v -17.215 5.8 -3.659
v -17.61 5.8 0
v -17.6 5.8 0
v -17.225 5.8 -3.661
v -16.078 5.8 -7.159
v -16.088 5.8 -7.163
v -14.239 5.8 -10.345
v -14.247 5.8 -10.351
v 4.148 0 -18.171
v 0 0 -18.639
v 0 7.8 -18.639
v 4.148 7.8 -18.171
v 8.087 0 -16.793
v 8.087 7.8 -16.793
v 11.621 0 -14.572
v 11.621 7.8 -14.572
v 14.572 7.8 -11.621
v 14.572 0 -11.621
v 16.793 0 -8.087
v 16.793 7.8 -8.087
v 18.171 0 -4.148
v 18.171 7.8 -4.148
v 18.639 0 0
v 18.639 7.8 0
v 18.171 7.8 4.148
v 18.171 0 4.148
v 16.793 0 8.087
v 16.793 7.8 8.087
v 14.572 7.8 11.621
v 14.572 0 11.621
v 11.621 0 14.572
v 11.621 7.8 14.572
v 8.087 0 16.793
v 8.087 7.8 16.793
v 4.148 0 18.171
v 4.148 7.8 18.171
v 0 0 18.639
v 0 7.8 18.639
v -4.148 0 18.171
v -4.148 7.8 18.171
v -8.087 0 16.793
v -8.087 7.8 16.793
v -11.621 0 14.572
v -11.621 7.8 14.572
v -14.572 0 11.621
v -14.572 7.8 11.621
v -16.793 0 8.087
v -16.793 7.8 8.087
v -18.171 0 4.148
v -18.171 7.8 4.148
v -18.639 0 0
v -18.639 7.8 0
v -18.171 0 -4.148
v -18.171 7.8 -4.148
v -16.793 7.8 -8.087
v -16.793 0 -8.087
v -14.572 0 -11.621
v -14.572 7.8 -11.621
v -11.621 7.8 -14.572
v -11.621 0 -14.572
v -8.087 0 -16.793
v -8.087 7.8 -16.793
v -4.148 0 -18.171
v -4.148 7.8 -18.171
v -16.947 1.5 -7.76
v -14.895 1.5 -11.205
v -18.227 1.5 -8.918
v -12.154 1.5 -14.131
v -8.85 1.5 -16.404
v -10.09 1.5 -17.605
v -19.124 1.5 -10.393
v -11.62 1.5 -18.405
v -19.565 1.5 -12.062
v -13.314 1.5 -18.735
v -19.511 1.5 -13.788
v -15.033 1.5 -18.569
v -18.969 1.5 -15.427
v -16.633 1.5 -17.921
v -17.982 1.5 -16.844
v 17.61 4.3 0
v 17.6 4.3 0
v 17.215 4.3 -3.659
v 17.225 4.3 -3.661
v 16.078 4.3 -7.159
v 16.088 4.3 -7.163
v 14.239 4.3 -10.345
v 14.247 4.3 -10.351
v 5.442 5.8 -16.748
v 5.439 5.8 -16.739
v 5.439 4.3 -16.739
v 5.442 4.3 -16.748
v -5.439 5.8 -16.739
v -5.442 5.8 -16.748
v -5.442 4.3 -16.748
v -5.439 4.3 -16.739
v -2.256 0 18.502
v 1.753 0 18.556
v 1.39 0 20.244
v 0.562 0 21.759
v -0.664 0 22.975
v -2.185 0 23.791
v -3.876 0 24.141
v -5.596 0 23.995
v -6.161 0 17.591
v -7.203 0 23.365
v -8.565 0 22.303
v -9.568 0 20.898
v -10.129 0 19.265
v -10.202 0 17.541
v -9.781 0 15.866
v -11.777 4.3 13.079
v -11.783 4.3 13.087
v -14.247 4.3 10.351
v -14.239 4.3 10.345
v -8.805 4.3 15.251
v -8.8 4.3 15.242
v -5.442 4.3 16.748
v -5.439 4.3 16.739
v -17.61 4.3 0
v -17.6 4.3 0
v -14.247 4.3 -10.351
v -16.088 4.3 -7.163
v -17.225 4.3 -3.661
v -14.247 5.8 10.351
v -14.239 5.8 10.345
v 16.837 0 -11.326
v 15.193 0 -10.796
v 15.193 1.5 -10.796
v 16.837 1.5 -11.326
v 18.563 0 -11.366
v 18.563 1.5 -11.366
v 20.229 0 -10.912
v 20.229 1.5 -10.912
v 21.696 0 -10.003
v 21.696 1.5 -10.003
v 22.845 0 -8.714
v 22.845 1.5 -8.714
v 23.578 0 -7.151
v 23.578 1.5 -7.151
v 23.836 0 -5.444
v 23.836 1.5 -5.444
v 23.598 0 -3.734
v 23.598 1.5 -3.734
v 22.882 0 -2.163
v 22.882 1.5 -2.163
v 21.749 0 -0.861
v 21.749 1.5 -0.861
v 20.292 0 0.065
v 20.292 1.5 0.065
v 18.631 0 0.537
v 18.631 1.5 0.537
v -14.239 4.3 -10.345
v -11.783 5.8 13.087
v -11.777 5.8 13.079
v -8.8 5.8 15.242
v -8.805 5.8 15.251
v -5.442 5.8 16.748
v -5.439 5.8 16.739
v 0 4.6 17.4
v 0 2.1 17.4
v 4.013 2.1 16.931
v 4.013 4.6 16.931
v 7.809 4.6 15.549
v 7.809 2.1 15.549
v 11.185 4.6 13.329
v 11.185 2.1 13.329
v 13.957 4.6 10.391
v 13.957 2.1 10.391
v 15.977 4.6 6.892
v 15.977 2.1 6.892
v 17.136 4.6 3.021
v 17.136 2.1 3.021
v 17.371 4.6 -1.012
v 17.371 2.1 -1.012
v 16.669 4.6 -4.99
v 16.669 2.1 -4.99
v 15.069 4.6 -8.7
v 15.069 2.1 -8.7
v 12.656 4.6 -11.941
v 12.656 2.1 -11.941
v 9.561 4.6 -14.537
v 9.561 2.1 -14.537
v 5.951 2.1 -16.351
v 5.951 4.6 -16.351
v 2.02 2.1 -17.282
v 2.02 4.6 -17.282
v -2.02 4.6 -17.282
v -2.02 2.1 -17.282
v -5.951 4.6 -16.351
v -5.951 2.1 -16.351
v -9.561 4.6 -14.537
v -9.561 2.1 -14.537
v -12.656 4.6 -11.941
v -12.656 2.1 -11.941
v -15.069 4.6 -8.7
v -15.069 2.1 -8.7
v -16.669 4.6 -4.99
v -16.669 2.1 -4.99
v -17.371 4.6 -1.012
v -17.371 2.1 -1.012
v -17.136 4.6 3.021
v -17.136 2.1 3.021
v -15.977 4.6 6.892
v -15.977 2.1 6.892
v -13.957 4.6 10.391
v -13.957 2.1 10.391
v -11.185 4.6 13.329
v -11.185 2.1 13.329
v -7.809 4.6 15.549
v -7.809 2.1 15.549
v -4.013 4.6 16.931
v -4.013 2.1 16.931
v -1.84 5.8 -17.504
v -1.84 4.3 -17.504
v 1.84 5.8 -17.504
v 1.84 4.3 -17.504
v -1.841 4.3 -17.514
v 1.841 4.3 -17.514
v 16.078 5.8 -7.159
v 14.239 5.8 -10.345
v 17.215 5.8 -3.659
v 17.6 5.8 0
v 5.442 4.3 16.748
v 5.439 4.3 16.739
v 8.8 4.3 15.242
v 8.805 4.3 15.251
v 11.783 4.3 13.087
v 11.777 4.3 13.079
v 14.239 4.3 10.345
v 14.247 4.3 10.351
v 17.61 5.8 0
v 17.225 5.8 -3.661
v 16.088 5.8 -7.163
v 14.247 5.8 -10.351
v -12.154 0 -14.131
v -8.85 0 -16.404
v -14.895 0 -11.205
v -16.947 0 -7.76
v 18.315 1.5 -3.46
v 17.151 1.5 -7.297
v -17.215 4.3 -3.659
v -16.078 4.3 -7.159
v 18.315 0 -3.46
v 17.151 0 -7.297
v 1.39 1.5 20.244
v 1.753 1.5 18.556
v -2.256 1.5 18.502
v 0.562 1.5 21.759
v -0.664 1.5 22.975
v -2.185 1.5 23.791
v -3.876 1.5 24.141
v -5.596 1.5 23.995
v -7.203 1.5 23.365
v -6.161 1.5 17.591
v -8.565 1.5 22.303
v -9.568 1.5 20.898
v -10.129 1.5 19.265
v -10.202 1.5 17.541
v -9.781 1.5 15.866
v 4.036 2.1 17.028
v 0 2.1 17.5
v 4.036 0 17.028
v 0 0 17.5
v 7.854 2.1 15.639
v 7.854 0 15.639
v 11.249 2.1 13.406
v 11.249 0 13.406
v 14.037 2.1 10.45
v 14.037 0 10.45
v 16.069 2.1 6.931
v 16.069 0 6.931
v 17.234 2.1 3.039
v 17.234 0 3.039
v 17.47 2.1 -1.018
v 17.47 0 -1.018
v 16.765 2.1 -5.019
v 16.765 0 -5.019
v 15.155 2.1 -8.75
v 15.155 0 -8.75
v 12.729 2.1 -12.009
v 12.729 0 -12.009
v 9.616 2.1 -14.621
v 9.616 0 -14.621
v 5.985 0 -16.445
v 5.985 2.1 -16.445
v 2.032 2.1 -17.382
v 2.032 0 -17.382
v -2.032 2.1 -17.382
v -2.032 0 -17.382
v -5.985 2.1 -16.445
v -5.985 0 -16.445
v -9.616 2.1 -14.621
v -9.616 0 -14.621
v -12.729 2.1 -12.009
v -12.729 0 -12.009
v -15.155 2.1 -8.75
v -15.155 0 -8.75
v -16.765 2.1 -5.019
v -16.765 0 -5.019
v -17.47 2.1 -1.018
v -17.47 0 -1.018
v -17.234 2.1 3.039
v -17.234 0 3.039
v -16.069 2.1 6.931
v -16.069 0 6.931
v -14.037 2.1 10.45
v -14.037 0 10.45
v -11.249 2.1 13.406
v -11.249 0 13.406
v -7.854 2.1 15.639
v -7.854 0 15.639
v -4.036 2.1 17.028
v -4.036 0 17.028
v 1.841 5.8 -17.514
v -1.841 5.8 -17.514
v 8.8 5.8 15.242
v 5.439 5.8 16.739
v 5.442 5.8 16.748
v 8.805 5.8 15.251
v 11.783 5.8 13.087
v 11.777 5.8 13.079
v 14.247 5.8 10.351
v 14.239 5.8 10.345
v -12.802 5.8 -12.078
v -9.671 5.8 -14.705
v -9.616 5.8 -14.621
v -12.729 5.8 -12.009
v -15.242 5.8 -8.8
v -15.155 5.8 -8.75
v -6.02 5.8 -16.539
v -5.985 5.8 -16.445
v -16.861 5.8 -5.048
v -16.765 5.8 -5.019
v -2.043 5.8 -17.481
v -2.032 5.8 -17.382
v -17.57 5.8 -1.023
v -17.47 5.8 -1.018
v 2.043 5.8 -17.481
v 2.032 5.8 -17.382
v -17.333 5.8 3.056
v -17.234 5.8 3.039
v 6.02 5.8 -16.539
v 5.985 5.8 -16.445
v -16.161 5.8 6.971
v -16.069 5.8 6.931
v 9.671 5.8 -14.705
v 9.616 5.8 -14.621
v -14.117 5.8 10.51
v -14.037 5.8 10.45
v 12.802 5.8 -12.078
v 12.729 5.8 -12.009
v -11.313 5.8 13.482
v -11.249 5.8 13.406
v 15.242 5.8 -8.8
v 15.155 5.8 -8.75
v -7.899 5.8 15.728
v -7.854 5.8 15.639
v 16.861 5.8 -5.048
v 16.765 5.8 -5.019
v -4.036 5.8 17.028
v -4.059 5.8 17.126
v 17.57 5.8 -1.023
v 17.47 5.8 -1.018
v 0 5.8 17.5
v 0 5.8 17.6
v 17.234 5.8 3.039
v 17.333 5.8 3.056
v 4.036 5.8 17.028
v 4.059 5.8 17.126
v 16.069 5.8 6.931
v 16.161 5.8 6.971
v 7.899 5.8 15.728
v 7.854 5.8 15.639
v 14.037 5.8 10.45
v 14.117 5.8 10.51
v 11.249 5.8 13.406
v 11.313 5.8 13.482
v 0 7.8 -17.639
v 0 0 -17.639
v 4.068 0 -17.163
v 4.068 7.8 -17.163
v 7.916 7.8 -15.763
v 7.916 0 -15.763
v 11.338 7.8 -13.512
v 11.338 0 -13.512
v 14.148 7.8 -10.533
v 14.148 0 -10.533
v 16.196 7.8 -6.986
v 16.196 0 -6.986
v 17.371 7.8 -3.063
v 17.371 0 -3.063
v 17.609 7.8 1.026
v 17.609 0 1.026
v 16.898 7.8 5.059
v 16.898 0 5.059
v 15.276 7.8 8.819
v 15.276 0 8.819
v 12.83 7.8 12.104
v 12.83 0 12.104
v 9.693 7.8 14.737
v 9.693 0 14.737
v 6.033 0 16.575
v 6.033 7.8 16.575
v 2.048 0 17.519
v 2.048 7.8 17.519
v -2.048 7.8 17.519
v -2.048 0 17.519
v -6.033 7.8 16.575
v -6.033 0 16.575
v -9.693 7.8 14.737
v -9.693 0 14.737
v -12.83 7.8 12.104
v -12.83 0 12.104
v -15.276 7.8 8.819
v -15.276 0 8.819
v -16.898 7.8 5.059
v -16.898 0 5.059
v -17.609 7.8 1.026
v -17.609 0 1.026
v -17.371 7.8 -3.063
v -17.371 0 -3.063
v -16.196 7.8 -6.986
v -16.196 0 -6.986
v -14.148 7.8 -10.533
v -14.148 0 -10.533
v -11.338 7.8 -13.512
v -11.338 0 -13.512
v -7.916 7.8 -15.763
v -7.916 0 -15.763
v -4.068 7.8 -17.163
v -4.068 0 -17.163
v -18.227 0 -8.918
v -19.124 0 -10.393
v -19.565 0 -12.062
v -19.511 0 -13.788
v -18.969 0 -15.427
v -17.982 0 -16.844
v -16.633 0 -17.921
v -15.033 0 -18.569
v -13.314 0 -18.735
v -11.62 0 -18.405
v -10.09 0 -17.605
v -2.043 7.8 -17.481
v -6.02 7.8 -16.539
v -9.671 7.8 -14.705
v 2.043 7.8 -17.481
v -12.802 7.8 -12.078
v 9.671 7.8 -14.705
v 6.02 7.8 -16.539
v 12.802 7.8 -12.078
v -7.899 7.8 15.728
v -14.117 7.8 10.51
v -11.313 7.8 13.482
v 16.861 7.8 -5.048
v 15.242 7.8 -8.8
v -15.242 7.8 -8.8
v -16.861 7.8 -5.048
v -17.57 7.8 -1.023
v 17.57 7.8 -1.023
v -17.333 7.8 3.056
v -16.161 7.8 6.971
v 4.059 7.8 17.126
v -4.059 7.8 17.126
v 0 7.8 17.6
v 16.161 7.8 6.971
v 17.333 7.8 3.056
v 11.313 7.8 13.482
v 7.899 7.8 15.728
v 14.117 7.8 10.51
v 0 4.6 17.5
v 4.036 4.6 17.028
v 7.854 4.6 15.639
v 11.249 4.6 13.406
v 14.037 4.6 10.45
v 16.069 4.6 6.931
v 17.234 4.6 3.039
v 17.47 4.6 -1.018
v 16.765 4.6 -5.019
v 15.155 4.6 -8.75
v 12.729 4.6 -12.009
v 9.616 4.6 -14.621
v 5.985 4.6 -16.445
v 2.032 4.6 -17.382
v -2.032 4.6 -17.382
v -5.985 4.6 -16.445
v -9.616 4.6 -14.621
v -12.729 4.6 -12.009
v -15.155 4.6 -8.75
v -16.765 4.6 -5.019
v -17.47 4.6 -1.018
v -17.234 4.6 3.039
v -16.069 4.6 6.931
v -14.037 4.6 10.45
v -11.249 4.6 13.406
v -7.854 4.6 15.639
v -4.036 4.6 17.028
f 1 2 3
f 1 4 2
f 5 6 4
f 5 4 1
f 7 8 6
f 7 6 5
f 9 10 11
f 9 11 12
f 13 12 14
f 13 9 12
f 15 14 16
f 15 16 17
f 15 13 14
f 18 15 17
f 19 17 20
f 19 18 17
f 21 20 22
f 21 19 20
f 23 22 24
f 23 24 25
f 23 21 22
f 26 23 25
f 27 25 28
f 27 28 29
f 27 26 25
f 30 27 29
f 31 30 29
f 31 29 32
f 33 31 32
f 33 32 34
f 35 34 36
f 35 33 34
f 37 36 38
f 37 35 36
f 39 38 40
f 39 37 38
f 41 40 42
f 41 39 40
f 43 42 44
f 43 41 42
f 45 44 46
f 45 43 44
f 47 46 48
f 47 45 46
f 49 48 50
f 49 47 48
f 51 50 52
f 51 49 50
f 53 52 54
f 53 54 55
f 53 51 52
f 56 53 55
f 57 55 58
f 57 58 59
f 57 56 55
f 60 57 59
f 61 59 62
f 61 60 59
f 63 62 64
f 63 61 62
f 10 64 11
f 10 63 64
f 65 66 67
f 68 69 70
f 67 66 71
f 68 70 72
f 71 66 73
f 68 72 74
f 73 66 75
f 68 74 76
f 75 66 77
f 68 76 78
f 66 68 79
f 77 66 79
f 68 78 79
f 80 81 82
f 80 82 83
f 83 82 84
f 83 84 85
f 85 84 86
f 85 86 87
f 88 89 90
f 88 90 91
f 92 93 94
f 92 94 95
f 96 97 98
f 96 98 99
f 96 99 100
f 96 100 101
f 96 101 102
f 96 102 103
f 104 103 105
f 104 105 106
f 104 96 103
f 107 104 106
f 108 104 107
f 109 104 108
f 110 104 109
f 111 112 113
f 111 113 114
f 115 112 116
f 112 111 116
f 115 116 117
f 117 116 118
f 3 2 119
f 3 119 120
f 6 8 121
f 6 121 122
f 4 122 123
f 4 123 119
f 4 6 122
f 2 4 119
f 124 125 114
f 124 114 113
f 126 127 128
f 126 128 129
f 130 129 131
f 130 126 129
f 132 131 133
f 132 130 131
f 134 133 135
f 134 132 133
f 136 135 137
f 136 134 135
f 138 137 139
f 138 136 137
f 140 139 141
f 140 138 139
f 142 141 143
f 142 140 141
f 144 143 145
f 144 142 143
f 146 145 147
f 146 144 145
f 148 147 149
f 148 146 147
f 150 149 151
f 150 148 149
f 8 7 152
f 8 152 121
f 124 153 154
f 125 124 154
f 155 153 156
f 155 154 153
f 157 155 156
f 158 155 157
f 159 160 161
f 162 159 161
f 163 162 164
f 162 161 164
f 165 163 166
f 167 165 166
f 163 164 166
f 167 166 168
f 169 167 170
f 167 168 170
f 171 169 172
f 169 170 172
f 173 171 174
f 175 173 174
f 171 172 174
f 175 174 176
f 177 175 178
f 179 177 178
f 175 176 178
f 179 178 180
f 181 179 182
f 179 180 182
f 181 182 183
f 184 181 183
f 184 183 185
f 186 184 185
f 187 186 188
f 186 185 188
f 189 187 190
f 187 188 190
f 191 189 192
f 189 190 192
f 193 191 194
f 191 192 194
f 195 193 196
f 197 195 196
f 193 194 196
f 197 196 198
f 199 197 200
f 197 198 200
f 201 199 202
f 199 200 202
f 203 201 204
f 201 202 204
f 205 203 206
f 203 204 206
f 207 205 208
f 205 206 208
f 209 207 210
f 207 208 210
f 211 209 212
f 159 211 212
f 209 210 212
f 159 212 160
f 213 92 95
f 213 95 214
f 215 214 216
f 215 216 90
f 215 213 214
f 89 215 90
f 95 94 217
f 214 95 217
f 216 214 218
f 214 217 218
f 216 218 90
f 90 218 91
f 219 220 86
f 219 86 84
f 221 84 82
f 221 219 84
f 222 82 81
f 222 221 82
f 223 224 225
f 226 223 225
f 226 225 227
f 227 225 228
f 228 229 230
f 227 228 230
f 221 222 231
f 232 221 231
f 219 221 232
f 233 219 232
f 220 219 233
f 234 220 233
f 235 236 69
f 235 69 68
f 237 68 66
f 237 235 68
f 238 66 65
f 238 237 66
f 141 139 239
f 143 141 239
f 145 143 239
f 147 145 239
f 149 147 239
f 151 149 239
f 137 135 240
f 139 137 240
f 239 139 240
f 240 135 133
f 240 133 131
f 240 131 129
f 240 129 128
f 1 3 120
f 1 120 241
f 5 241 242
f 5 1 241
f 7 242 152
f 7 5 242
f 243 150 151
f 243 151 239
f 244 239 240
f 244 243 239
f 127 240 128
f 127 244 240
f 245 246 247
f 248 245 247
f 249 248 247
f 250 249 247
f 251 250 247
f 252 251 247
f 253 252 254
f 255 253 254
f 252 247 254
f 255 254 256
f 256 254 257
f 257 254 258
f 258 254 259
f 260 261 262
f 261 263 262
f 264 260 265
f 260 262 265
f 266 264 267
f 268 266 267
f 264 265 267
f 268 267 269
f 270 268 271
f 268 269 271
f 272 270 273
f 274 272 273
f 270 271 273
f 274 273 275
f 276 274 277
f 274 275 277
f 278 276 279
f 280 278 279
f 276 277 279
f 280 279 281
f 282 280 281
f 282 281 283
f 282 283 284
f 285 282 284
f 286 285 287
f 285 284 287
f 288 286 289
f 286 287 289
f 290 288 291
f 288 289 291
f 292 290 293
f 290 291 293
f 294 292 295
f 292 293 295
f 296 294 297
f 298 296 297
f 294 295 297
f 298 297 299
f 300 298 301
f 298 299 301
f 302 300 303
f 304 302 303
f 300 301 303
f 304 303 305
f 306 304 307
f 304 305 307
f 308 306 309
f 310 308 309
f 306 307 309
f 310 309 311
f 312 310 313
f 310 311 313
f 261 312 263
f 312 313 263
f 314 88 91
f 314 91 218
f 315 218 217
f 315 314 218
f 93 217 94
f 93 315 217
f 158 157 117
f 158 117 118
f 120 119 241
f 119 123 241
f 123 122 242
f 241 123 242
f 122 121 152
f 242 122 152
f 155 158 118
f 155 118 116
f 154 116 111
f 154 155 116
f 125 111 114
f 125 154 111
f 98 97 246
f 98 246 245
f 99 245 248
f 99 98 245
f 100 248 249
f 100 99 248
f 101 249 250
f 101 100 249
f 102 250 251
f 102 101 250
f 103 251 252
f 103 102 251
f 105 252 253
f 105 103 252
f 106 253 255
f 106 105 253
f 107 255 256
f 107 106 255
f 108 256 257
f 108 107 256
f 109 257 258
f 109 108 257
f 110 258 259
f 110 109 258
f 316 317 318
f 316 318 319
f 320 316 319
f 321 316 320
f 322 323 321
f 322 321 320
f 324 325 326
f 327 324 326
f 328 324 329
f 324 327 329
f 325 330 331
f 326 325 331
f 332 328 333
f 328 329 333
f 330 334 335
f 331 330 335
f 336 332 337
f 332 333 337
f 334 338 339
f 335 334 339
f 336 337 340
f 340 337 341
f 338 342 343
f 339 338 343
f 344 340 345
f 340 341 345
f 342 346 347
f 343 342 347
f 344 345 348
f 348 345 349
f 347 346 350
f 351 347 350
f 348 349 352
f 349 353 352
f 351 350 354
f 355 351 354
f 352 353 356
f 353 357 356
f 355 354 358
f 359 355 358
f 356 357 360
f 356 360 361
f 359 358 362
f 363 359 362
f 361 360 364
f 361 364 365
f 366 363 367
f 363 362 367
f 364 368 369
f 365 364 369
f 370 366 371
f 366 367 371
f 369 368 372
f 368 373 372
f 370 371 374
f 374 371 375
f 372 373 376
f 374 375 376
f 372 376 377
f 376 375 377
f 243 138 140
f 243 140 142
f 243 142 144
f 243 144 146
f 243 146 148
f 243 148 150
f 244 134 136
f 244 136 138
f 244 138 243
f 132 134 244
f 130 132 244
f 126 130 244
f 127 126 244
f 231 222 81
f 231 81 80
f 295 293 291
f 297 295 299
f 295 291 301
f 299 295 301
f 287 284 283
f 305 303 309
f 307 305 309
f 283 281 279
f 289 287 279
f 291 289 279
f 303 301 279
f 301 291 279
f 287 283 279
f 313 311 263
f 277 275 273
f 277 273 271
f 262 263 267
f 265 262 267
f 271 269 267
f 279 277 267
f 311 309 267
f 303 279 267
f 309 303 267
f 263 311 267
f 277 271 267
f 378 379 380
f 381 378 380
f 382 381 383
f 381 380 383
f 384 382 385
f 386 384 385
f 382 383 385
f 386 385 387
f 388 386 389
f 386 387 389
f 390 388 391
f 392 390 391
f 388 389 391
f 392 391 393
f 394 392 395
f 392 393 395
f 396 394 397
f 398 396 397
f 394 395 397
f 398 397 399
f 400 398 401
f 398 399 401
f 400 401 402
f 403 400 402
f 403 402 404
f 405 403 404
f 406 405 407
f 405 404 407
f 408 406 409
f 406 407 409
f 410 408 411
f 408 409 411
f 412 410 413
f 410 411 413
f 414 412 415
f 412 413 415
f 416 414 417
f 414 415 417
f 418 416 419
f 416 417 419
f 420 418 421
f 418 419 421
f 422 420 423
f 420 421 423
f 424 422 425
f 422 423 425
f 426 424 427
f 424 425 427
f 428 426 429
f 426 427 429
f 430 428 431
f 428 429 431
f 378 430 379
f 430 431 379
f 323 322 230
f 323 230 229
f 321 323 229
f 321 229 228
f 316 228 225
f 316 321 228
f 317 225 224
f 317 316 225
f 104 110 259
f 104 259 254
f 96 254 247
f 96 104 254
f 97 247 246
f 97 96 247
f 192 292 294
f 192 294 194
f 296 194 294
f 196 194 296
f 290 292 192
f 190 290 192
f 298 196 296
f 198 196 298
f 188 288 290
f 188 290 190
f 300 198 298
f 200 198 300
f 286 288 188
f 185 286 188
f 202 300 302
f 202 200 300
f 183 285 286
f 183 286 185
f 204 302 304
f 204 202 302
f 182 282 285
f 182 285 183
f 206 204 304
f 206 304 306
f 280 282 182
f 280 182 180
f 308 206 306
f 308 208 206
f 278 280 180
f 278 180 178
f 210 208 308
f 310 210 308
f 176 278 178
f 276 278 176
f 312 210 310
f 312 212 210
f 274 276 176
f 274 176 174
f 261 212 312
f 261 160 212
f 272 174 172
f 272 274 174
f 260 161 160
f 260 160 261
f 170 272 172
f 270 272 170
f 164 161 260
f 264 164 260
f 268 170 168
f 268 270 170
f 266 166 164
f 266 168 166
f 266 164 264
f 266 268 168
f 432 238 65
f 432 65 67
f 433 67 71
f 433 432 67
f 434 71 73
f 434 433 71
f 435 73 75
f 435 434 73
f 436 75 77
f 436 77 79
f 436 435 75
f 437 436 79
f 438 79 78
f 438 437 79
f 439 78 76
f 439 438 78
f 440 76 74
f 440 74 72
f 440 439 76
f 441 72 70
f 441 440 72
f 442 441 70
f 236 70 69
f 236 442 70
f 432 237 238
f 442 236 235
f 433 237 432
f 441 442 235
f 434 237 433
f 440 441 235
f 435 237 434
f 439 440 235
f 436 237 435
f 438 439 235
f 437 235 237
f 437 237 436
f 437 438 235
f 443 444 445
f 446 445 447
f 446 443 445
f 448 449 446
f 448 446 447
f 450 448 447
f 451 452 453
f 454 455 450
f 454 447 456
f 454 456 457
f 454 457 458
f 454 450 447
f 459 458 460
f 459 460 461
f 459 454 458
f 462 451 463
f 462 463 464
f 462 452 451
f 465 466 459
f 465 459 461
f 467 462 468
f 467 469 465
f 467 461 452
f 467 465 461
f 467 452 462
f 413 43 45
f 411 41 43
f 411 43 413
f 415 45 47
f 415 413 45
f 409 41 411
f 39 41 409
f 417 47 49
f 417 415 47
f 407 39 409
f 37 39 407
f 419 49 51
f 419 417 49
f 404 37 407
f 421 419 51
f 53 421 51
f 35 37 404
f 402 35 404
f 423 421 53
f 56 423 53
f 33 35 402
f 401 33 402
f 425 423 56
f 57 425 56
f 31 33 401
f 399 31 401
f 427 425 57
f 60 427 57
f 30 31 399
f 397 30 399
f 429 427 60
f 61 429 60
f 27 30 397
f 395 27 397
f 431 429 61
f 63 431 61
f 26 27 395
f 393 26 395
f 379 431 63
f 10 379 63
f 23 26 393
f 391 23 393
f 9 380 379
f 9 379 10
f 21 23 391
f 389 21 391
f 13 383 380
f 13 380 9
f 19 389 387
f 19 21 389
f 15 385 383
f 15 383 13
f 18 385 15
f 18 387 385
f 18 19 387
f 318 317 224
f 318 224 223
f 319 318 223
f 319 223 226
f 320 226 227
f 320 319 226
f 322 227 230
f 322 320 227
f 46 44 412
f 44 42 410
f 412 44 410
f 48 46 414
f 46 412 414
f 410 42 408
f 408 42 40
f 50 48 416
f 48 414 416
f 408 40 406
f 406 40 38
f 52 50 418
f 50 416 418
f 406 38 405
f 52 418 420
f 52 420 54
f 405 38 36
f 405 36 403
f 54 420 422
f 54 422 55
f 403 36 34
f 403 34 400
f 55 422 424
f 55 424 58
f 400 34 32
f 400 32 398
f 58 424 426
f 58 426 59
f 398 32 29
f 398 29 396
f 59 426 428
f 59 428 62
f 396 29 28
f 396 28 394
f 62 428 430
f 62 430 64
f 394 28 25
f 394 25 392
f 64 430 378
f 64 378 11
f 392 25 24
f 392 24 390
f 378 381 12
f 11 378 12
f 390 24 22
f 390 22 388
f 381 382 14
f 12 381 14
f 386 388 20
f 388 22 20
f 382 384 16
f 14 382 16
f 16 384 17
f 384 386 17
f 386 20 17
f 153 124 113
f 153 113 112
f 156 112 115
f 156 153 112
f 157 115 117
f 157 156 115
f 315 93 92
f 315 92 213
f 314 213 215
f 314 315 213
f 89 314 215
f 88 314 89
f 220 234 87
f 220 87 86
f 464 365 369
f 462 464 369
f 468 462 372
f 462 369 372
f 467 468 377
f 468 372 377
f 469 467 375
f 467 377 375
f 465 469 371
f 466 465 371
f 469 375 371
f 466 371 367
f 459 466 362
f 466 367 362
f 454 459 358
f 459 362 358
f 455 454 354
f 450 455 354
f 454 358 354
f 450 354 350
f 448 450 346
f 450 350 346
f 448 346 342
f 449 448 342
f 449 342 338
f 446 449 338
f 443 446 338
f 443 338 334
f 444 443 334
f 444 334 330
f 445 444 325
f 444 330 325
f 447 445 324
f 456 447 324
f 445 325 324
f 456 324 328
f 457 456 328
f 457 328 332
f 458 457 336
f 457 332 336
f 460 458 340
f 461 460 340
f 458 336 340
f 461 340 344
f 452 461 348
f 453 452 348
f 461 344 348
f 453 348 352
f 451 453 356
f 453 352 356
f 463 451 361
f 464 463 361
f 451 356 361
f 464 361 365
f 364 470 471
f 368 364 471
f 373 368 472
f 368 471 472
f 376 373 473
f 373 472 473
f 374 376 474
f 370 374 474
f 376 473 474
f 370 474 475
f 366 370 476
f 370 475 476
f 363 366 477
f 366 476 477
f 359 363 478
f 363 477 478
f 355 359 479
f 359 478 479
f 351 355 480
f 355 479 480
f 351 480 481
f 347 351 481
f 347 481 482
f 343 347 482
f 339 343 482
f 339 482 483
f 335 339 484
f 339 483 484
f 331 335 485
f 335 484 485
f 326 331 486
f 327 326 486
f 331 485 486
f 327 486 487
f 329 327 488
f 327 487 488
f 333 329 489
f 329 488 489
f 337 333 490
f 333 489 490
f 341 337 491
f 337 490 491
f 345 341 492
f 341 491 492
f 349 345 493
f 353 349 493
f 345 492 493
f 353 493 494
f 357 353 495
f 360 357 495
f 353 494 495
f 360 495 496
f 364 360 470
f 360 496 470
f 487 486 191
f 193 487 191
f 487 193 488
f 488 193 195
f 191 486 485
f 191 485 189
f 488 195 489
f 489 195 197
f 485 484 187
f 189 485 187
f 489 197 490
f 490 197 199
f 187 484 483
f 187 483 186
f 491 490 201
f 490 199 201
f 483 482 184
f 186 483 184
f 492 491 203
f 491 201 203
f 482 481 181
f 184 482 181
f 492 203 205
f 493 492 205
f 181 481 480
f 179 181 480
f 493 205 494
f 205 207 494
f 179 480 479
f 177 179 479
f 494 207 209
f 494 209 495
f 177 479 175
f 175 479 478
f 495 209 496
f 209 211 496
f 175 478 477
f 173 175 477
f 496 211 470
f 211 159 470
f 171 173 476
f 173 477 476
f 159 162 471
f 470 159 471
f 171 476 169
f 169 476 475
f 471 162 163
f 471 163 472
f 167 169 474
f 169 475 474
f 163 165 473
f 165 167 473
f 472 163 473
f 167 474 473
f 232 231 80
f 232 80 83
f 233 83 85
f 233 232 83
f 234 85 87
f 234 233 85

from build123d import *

# Parameters (mm, degrees)
SKETCH1_R             = 17.5
BOSS_EXTRUDE1_DEPTH   = 2
SKETCH2_R             = 17.5
BOSS_EXTRUDE2_DEPTH   = 0.1
SKETCH3_R             = 17.4
BOSS_EXTRUDE3_DEPTH   = 2.5
SKETCH4_R             = 17.5
BOSS_EXTRUDE4_DEPTH   = 1.2
SKETCH5_R             = 17.6
BOSS_EXTRUDE5_DEPTH   = 2
SKETCH6_R             = 18.638737407
SKETCH6_R_2           = 17.638737407
BOSS_EXTRUDE7_DEPTH   = 7.8
BOSS_EXTRUDE8_DEPTH   = 1.5
BOSS_EXTRUDE8_2_DEPTH = 1.5
BOSS_EXTRUDE8_3_DEPTH = 1.5
BOSS_EXTRUDE9_START   = -2
BOSS_EXTRUDE9_DEPTH   = 1.5
BOSS_EXTRUDE9_2_DEPTH = 1.5
BOSS_EXTRUDE9_3_DEPTH = 1.5
BOSS_EXTRUDE9_4_DEPTH = 1.5
BOSS_EXTRUDE9_5_DEPTH = 1.5


with BuildPart() as part:
    # Sketch1 → Boss-Extrude1 (new body)
    with BuildSketch(Plane(origin=(0, 0, 0), x_dir=(1, 0, 0), z_dir=(0, 1, 0))):
        with Locations(Location((0, 0, 0), (0, 0, 270))):
            Circle(SKETCH1_R)
    extrude(amount=BOSS_EXTRUDE1_DEPTH)

    # Sketch2 → Boss-Extrude2 (add)
    with BuildSketch(Plane(origin=(0, 2, 0), x_dir=(1, 0, 0), z_dir=(0, 1, 0))):
        with Locations(Location((0, 0, 0), (0, 0, 270))):
            Circle(SKETCH2_R)
    extrude(amount=BOSS_EXTRUDE2_DEPTH)

    # Sketch3 → Boss-Extrude3 (add)
    with BuildSketch(Plane(origin=(0, 2.1, 0), x_dir=(1, 0, 0), z_dir=(0, 1, 0))):
        with Locations(Location((0, 0, 0), (0, 0, 270))):
            Circle(SKETCH3_R)
    extrude(amount=BOSS_EXTRUDE3_DEPTH)

    # Sketch4 → Boss-Extrude4 (add)
    with BuildSketch(Plane(origin=(0, 4.6, 0), x_dir=(1, 0, 0), z_dir=(0, 1, 0))):
        with Locations(Location((0, 0, 0), (0, 0, 270))):
            Circle(SKETCH4_R)
    extrude(amount=BOSS_EXTRUDE4_DEPTH)

    # Sketch5 → Boss-Extrude5 (add)
    with BuildSketch(Plane(origin=(0, 5.8, 0), x_dir=(1, 0, 0), z_dir=(0, 1, 0))):
        with Locations(Location((0, 0, 0), (0, 0, 270))):
            Circle(SKETCH5_R)
    extrude(amount=BOSS_EXTRUDE5_DEPTH)


with BuildPart() as body_2:
    # Sketch6 → Boss-Extrude7 (new body)
    with BuildSketch(Plane.XZ):
        with Locations(Location((0, 0, 0), (0, 0, 270))):
            Circle(SKETCH6_R)
        with Locations(Location((0, 0, 0), (0, 0, 270))):
            Circle(SKETCH6_R_2, mode=Mode.SUBTRACT)
    extrude(amount=-BOSS_EXTRUDE7_DEPTH)


with BuildPart() as body_3:
    # Sketch7 → Boss-Extrude8 (new body)
    with BuildSketch(Plane(origin=(0, 0, 0), x_dir=(-1, 0, 0), z_dir=(0, -1, 0))):
        with BuildLine():
            ThreePointArc((16.946626552, 7.759792564), (17.982185174, 16.843645609), (8.850091423, 16.403609784))
            ThreePointArc((8.850091423, 16.403609784), (13.603181929, 12.741898349), (16.946626552, 7.759792564))
        make_face()
    extrude(amount=-BOSS_EXTRUDE8_DEPTH)


with BuildPart() as body_4:
    # Sketch7 → Boss-Extrude8 2 (new body)
    with BuildSketch(Plane(origin=(0, 0, 0), x_dir=(-1, 0, 0), z_dir=(0, -1, 0))):
        with BuildLine():
            ThreePointArc((-18.630988498, -0.537400894), (-17.836398627, 5.409751949), (-15.193490764, 10.796312821))
            ThreePointArc((-15.193490764, 10.796312821), (-23.578117576, 7.151206371), (-18.630988498, -0.537400894))
        make_face()
    extrude(amount=-BOSS_EXTRUDE8_2_DEPTH)


with BuildPart() as body_5:
    # Sketch7 → Boss-Extrude8 3 (new body)
    with BuildSketch(Plane(origin=(0, 0, 0), x_dir=(-1, 0, 0), z_dir=(0, -1, 0))):
        with BuildLine():
            ThreePointArc((-1.753135788, -18.556105384), (5.595932403, -23.99485198), (9.780897075, -15.86620889))
            ThreePointArc((9.780897075, -15.86620889), (4.233216698, -18.151650297), (-1.753135788, -18.556105384))
        make_face()
    extrude(amount=-BOSS_EXTRUDE8_3_DEPTH)


with BuildPart() as body_6:
    # Sketch9 → Boss-Extrude9 (new body)
    with BuildSketch(Plane(origin=(0, 7.8, 0), x_dir=(1, 0, 0), z_dir=(0, 1, 0)).offset(BOSS_EXTRUDE9_START)):
        with BuildLine():
            Line((-17.61, 0), (-17.6, 0))
            ThreePointArc((-17.6, 0), (-16.738594687, 5.438699101), (-14.238699101, 10.34502044))
            Line((-14.238699101, 10.34502044), (-14.246789271, 10.350898293))
            ThreePointArc((-14.246789271, 10.350898293), (-16.748105252, 5.441789271), (-17.61, 0))
        make_face()
    extrude(amount=-BOSS_EXTRUDE9_DEPTH)


with BuildPart() as body_7:
    # Sketch9 → Boss-Extrude9 2 (new body)
    with BuildSketch(Plane(origin=(0, 7.8, 0), x_dir=(1, 0, 0), z_dir=(0, 1, 0)).offset(BOSS_EXTRUDE9_START)):
        with BuildLine():
            Line((-5.441789271, 16.748105252), (-5.438699101, 16.738594687))
            ThreePointArc((-5.438699101, 16.738594687), (0, 17.6), (5.438699101, 16.738594687))
            Line((5.438699101, 16.738594687), (5.441789271, 16.748105252))
            ThreePointArc((5.441789271, 16.748105252), (0, 17.61), (-5.441789271, 16.748105252))
        make_face()
    extrude(amount=-BOSS_EXTRUDE9_2_DEPTH)


with BuildPart() as body_8:
    # Sketch9 → Boss-Extrude9 3 (new body)
    with BuildSketch(Plane(origin=(0, 7.8, 0), x_dir=(1, 0, 0), z_dir=(0, 1, 0)).offset(BOSS_EXTRUDE9_START)):
        with BuildLine():
            Line((14.246789271, 10.350898293), (14.238699101, 10.34502044))
            ThreePointArc((14.238699101, 10.34502044), (16.738594687, 5.438699101), (17.6, 0))
            Line((17.6, 0), (17.61, 0))
            ThreePointArc((17.61, 0), (16.748105252, 5.441789271), (14.246789271, 10.350898293))
        make_face()
    extrude(amount=-BOSS_EXTRUDE9_3_DEPTH)


with BuildPart() as body_9:
    # Sketch9 → Boss-Extrude9 4 (new body)
    with BuildSketch(Plane(origin=(0, 7.8, 0), x_dir=(1, 0, 0), z_dir=(0, 1, 0)).offset(BOSS_EXTRUDE9_START)):
        with BuildLine():
            Line((14.246789271, -10.350898293), (14.238699101, -10.34502044))
            ThreePointArc((14.238699101, -10.34502044), (10.34502044, -14.238699101), (5.438699101, -16.738594687))
            Line((5.438699101, -16.738594687), (5.441789271, -16.748105252))
            ThreePointArc((5.441789271, -16.748105252), (10.350898293, -14.246789271), (14.246789271, -10.350898293))
        make_face()
    extrude(amount=-BOSS_EXTRUDE9_4_DEPTH)


with BuildPart() as body_10:
    # Sketch9 → Boss-Extrude9 5 (new body)
    with BuildSketch(Plane(origin=(0, 7.8, 0), x_dir=(1, 0, 0), z_dir=(0, 1, 0)).offset(BOSS_EXTRUDE9_START)):
        with BuildLine():
            Line((-5.441789271, -16.748105252), (-5.438699101, -16.738594687))
            ThreePointArc((-5.438699101, -16.738594687), (-10.34502044, -14.238699101), (-14.238699101, -10.34502044))
            Line((-14.238699101, -10.34502044), (-14.246789271, -10.350898293))
            ThreePointArc((-14.246789271, -10.350898293), (-10.350898293, -14.246789271), (-5.441789271, -16.748105252))
        make_face()
    extrude(amount=-BOSS_EXTRUDE9_5_DEPTH)


solid = Compound([part.part, body_2.part, body_3.part, body_4.part, body_5.part, body_6.part, body_7.part, body_8.part, body_9.part, body_10.part])
